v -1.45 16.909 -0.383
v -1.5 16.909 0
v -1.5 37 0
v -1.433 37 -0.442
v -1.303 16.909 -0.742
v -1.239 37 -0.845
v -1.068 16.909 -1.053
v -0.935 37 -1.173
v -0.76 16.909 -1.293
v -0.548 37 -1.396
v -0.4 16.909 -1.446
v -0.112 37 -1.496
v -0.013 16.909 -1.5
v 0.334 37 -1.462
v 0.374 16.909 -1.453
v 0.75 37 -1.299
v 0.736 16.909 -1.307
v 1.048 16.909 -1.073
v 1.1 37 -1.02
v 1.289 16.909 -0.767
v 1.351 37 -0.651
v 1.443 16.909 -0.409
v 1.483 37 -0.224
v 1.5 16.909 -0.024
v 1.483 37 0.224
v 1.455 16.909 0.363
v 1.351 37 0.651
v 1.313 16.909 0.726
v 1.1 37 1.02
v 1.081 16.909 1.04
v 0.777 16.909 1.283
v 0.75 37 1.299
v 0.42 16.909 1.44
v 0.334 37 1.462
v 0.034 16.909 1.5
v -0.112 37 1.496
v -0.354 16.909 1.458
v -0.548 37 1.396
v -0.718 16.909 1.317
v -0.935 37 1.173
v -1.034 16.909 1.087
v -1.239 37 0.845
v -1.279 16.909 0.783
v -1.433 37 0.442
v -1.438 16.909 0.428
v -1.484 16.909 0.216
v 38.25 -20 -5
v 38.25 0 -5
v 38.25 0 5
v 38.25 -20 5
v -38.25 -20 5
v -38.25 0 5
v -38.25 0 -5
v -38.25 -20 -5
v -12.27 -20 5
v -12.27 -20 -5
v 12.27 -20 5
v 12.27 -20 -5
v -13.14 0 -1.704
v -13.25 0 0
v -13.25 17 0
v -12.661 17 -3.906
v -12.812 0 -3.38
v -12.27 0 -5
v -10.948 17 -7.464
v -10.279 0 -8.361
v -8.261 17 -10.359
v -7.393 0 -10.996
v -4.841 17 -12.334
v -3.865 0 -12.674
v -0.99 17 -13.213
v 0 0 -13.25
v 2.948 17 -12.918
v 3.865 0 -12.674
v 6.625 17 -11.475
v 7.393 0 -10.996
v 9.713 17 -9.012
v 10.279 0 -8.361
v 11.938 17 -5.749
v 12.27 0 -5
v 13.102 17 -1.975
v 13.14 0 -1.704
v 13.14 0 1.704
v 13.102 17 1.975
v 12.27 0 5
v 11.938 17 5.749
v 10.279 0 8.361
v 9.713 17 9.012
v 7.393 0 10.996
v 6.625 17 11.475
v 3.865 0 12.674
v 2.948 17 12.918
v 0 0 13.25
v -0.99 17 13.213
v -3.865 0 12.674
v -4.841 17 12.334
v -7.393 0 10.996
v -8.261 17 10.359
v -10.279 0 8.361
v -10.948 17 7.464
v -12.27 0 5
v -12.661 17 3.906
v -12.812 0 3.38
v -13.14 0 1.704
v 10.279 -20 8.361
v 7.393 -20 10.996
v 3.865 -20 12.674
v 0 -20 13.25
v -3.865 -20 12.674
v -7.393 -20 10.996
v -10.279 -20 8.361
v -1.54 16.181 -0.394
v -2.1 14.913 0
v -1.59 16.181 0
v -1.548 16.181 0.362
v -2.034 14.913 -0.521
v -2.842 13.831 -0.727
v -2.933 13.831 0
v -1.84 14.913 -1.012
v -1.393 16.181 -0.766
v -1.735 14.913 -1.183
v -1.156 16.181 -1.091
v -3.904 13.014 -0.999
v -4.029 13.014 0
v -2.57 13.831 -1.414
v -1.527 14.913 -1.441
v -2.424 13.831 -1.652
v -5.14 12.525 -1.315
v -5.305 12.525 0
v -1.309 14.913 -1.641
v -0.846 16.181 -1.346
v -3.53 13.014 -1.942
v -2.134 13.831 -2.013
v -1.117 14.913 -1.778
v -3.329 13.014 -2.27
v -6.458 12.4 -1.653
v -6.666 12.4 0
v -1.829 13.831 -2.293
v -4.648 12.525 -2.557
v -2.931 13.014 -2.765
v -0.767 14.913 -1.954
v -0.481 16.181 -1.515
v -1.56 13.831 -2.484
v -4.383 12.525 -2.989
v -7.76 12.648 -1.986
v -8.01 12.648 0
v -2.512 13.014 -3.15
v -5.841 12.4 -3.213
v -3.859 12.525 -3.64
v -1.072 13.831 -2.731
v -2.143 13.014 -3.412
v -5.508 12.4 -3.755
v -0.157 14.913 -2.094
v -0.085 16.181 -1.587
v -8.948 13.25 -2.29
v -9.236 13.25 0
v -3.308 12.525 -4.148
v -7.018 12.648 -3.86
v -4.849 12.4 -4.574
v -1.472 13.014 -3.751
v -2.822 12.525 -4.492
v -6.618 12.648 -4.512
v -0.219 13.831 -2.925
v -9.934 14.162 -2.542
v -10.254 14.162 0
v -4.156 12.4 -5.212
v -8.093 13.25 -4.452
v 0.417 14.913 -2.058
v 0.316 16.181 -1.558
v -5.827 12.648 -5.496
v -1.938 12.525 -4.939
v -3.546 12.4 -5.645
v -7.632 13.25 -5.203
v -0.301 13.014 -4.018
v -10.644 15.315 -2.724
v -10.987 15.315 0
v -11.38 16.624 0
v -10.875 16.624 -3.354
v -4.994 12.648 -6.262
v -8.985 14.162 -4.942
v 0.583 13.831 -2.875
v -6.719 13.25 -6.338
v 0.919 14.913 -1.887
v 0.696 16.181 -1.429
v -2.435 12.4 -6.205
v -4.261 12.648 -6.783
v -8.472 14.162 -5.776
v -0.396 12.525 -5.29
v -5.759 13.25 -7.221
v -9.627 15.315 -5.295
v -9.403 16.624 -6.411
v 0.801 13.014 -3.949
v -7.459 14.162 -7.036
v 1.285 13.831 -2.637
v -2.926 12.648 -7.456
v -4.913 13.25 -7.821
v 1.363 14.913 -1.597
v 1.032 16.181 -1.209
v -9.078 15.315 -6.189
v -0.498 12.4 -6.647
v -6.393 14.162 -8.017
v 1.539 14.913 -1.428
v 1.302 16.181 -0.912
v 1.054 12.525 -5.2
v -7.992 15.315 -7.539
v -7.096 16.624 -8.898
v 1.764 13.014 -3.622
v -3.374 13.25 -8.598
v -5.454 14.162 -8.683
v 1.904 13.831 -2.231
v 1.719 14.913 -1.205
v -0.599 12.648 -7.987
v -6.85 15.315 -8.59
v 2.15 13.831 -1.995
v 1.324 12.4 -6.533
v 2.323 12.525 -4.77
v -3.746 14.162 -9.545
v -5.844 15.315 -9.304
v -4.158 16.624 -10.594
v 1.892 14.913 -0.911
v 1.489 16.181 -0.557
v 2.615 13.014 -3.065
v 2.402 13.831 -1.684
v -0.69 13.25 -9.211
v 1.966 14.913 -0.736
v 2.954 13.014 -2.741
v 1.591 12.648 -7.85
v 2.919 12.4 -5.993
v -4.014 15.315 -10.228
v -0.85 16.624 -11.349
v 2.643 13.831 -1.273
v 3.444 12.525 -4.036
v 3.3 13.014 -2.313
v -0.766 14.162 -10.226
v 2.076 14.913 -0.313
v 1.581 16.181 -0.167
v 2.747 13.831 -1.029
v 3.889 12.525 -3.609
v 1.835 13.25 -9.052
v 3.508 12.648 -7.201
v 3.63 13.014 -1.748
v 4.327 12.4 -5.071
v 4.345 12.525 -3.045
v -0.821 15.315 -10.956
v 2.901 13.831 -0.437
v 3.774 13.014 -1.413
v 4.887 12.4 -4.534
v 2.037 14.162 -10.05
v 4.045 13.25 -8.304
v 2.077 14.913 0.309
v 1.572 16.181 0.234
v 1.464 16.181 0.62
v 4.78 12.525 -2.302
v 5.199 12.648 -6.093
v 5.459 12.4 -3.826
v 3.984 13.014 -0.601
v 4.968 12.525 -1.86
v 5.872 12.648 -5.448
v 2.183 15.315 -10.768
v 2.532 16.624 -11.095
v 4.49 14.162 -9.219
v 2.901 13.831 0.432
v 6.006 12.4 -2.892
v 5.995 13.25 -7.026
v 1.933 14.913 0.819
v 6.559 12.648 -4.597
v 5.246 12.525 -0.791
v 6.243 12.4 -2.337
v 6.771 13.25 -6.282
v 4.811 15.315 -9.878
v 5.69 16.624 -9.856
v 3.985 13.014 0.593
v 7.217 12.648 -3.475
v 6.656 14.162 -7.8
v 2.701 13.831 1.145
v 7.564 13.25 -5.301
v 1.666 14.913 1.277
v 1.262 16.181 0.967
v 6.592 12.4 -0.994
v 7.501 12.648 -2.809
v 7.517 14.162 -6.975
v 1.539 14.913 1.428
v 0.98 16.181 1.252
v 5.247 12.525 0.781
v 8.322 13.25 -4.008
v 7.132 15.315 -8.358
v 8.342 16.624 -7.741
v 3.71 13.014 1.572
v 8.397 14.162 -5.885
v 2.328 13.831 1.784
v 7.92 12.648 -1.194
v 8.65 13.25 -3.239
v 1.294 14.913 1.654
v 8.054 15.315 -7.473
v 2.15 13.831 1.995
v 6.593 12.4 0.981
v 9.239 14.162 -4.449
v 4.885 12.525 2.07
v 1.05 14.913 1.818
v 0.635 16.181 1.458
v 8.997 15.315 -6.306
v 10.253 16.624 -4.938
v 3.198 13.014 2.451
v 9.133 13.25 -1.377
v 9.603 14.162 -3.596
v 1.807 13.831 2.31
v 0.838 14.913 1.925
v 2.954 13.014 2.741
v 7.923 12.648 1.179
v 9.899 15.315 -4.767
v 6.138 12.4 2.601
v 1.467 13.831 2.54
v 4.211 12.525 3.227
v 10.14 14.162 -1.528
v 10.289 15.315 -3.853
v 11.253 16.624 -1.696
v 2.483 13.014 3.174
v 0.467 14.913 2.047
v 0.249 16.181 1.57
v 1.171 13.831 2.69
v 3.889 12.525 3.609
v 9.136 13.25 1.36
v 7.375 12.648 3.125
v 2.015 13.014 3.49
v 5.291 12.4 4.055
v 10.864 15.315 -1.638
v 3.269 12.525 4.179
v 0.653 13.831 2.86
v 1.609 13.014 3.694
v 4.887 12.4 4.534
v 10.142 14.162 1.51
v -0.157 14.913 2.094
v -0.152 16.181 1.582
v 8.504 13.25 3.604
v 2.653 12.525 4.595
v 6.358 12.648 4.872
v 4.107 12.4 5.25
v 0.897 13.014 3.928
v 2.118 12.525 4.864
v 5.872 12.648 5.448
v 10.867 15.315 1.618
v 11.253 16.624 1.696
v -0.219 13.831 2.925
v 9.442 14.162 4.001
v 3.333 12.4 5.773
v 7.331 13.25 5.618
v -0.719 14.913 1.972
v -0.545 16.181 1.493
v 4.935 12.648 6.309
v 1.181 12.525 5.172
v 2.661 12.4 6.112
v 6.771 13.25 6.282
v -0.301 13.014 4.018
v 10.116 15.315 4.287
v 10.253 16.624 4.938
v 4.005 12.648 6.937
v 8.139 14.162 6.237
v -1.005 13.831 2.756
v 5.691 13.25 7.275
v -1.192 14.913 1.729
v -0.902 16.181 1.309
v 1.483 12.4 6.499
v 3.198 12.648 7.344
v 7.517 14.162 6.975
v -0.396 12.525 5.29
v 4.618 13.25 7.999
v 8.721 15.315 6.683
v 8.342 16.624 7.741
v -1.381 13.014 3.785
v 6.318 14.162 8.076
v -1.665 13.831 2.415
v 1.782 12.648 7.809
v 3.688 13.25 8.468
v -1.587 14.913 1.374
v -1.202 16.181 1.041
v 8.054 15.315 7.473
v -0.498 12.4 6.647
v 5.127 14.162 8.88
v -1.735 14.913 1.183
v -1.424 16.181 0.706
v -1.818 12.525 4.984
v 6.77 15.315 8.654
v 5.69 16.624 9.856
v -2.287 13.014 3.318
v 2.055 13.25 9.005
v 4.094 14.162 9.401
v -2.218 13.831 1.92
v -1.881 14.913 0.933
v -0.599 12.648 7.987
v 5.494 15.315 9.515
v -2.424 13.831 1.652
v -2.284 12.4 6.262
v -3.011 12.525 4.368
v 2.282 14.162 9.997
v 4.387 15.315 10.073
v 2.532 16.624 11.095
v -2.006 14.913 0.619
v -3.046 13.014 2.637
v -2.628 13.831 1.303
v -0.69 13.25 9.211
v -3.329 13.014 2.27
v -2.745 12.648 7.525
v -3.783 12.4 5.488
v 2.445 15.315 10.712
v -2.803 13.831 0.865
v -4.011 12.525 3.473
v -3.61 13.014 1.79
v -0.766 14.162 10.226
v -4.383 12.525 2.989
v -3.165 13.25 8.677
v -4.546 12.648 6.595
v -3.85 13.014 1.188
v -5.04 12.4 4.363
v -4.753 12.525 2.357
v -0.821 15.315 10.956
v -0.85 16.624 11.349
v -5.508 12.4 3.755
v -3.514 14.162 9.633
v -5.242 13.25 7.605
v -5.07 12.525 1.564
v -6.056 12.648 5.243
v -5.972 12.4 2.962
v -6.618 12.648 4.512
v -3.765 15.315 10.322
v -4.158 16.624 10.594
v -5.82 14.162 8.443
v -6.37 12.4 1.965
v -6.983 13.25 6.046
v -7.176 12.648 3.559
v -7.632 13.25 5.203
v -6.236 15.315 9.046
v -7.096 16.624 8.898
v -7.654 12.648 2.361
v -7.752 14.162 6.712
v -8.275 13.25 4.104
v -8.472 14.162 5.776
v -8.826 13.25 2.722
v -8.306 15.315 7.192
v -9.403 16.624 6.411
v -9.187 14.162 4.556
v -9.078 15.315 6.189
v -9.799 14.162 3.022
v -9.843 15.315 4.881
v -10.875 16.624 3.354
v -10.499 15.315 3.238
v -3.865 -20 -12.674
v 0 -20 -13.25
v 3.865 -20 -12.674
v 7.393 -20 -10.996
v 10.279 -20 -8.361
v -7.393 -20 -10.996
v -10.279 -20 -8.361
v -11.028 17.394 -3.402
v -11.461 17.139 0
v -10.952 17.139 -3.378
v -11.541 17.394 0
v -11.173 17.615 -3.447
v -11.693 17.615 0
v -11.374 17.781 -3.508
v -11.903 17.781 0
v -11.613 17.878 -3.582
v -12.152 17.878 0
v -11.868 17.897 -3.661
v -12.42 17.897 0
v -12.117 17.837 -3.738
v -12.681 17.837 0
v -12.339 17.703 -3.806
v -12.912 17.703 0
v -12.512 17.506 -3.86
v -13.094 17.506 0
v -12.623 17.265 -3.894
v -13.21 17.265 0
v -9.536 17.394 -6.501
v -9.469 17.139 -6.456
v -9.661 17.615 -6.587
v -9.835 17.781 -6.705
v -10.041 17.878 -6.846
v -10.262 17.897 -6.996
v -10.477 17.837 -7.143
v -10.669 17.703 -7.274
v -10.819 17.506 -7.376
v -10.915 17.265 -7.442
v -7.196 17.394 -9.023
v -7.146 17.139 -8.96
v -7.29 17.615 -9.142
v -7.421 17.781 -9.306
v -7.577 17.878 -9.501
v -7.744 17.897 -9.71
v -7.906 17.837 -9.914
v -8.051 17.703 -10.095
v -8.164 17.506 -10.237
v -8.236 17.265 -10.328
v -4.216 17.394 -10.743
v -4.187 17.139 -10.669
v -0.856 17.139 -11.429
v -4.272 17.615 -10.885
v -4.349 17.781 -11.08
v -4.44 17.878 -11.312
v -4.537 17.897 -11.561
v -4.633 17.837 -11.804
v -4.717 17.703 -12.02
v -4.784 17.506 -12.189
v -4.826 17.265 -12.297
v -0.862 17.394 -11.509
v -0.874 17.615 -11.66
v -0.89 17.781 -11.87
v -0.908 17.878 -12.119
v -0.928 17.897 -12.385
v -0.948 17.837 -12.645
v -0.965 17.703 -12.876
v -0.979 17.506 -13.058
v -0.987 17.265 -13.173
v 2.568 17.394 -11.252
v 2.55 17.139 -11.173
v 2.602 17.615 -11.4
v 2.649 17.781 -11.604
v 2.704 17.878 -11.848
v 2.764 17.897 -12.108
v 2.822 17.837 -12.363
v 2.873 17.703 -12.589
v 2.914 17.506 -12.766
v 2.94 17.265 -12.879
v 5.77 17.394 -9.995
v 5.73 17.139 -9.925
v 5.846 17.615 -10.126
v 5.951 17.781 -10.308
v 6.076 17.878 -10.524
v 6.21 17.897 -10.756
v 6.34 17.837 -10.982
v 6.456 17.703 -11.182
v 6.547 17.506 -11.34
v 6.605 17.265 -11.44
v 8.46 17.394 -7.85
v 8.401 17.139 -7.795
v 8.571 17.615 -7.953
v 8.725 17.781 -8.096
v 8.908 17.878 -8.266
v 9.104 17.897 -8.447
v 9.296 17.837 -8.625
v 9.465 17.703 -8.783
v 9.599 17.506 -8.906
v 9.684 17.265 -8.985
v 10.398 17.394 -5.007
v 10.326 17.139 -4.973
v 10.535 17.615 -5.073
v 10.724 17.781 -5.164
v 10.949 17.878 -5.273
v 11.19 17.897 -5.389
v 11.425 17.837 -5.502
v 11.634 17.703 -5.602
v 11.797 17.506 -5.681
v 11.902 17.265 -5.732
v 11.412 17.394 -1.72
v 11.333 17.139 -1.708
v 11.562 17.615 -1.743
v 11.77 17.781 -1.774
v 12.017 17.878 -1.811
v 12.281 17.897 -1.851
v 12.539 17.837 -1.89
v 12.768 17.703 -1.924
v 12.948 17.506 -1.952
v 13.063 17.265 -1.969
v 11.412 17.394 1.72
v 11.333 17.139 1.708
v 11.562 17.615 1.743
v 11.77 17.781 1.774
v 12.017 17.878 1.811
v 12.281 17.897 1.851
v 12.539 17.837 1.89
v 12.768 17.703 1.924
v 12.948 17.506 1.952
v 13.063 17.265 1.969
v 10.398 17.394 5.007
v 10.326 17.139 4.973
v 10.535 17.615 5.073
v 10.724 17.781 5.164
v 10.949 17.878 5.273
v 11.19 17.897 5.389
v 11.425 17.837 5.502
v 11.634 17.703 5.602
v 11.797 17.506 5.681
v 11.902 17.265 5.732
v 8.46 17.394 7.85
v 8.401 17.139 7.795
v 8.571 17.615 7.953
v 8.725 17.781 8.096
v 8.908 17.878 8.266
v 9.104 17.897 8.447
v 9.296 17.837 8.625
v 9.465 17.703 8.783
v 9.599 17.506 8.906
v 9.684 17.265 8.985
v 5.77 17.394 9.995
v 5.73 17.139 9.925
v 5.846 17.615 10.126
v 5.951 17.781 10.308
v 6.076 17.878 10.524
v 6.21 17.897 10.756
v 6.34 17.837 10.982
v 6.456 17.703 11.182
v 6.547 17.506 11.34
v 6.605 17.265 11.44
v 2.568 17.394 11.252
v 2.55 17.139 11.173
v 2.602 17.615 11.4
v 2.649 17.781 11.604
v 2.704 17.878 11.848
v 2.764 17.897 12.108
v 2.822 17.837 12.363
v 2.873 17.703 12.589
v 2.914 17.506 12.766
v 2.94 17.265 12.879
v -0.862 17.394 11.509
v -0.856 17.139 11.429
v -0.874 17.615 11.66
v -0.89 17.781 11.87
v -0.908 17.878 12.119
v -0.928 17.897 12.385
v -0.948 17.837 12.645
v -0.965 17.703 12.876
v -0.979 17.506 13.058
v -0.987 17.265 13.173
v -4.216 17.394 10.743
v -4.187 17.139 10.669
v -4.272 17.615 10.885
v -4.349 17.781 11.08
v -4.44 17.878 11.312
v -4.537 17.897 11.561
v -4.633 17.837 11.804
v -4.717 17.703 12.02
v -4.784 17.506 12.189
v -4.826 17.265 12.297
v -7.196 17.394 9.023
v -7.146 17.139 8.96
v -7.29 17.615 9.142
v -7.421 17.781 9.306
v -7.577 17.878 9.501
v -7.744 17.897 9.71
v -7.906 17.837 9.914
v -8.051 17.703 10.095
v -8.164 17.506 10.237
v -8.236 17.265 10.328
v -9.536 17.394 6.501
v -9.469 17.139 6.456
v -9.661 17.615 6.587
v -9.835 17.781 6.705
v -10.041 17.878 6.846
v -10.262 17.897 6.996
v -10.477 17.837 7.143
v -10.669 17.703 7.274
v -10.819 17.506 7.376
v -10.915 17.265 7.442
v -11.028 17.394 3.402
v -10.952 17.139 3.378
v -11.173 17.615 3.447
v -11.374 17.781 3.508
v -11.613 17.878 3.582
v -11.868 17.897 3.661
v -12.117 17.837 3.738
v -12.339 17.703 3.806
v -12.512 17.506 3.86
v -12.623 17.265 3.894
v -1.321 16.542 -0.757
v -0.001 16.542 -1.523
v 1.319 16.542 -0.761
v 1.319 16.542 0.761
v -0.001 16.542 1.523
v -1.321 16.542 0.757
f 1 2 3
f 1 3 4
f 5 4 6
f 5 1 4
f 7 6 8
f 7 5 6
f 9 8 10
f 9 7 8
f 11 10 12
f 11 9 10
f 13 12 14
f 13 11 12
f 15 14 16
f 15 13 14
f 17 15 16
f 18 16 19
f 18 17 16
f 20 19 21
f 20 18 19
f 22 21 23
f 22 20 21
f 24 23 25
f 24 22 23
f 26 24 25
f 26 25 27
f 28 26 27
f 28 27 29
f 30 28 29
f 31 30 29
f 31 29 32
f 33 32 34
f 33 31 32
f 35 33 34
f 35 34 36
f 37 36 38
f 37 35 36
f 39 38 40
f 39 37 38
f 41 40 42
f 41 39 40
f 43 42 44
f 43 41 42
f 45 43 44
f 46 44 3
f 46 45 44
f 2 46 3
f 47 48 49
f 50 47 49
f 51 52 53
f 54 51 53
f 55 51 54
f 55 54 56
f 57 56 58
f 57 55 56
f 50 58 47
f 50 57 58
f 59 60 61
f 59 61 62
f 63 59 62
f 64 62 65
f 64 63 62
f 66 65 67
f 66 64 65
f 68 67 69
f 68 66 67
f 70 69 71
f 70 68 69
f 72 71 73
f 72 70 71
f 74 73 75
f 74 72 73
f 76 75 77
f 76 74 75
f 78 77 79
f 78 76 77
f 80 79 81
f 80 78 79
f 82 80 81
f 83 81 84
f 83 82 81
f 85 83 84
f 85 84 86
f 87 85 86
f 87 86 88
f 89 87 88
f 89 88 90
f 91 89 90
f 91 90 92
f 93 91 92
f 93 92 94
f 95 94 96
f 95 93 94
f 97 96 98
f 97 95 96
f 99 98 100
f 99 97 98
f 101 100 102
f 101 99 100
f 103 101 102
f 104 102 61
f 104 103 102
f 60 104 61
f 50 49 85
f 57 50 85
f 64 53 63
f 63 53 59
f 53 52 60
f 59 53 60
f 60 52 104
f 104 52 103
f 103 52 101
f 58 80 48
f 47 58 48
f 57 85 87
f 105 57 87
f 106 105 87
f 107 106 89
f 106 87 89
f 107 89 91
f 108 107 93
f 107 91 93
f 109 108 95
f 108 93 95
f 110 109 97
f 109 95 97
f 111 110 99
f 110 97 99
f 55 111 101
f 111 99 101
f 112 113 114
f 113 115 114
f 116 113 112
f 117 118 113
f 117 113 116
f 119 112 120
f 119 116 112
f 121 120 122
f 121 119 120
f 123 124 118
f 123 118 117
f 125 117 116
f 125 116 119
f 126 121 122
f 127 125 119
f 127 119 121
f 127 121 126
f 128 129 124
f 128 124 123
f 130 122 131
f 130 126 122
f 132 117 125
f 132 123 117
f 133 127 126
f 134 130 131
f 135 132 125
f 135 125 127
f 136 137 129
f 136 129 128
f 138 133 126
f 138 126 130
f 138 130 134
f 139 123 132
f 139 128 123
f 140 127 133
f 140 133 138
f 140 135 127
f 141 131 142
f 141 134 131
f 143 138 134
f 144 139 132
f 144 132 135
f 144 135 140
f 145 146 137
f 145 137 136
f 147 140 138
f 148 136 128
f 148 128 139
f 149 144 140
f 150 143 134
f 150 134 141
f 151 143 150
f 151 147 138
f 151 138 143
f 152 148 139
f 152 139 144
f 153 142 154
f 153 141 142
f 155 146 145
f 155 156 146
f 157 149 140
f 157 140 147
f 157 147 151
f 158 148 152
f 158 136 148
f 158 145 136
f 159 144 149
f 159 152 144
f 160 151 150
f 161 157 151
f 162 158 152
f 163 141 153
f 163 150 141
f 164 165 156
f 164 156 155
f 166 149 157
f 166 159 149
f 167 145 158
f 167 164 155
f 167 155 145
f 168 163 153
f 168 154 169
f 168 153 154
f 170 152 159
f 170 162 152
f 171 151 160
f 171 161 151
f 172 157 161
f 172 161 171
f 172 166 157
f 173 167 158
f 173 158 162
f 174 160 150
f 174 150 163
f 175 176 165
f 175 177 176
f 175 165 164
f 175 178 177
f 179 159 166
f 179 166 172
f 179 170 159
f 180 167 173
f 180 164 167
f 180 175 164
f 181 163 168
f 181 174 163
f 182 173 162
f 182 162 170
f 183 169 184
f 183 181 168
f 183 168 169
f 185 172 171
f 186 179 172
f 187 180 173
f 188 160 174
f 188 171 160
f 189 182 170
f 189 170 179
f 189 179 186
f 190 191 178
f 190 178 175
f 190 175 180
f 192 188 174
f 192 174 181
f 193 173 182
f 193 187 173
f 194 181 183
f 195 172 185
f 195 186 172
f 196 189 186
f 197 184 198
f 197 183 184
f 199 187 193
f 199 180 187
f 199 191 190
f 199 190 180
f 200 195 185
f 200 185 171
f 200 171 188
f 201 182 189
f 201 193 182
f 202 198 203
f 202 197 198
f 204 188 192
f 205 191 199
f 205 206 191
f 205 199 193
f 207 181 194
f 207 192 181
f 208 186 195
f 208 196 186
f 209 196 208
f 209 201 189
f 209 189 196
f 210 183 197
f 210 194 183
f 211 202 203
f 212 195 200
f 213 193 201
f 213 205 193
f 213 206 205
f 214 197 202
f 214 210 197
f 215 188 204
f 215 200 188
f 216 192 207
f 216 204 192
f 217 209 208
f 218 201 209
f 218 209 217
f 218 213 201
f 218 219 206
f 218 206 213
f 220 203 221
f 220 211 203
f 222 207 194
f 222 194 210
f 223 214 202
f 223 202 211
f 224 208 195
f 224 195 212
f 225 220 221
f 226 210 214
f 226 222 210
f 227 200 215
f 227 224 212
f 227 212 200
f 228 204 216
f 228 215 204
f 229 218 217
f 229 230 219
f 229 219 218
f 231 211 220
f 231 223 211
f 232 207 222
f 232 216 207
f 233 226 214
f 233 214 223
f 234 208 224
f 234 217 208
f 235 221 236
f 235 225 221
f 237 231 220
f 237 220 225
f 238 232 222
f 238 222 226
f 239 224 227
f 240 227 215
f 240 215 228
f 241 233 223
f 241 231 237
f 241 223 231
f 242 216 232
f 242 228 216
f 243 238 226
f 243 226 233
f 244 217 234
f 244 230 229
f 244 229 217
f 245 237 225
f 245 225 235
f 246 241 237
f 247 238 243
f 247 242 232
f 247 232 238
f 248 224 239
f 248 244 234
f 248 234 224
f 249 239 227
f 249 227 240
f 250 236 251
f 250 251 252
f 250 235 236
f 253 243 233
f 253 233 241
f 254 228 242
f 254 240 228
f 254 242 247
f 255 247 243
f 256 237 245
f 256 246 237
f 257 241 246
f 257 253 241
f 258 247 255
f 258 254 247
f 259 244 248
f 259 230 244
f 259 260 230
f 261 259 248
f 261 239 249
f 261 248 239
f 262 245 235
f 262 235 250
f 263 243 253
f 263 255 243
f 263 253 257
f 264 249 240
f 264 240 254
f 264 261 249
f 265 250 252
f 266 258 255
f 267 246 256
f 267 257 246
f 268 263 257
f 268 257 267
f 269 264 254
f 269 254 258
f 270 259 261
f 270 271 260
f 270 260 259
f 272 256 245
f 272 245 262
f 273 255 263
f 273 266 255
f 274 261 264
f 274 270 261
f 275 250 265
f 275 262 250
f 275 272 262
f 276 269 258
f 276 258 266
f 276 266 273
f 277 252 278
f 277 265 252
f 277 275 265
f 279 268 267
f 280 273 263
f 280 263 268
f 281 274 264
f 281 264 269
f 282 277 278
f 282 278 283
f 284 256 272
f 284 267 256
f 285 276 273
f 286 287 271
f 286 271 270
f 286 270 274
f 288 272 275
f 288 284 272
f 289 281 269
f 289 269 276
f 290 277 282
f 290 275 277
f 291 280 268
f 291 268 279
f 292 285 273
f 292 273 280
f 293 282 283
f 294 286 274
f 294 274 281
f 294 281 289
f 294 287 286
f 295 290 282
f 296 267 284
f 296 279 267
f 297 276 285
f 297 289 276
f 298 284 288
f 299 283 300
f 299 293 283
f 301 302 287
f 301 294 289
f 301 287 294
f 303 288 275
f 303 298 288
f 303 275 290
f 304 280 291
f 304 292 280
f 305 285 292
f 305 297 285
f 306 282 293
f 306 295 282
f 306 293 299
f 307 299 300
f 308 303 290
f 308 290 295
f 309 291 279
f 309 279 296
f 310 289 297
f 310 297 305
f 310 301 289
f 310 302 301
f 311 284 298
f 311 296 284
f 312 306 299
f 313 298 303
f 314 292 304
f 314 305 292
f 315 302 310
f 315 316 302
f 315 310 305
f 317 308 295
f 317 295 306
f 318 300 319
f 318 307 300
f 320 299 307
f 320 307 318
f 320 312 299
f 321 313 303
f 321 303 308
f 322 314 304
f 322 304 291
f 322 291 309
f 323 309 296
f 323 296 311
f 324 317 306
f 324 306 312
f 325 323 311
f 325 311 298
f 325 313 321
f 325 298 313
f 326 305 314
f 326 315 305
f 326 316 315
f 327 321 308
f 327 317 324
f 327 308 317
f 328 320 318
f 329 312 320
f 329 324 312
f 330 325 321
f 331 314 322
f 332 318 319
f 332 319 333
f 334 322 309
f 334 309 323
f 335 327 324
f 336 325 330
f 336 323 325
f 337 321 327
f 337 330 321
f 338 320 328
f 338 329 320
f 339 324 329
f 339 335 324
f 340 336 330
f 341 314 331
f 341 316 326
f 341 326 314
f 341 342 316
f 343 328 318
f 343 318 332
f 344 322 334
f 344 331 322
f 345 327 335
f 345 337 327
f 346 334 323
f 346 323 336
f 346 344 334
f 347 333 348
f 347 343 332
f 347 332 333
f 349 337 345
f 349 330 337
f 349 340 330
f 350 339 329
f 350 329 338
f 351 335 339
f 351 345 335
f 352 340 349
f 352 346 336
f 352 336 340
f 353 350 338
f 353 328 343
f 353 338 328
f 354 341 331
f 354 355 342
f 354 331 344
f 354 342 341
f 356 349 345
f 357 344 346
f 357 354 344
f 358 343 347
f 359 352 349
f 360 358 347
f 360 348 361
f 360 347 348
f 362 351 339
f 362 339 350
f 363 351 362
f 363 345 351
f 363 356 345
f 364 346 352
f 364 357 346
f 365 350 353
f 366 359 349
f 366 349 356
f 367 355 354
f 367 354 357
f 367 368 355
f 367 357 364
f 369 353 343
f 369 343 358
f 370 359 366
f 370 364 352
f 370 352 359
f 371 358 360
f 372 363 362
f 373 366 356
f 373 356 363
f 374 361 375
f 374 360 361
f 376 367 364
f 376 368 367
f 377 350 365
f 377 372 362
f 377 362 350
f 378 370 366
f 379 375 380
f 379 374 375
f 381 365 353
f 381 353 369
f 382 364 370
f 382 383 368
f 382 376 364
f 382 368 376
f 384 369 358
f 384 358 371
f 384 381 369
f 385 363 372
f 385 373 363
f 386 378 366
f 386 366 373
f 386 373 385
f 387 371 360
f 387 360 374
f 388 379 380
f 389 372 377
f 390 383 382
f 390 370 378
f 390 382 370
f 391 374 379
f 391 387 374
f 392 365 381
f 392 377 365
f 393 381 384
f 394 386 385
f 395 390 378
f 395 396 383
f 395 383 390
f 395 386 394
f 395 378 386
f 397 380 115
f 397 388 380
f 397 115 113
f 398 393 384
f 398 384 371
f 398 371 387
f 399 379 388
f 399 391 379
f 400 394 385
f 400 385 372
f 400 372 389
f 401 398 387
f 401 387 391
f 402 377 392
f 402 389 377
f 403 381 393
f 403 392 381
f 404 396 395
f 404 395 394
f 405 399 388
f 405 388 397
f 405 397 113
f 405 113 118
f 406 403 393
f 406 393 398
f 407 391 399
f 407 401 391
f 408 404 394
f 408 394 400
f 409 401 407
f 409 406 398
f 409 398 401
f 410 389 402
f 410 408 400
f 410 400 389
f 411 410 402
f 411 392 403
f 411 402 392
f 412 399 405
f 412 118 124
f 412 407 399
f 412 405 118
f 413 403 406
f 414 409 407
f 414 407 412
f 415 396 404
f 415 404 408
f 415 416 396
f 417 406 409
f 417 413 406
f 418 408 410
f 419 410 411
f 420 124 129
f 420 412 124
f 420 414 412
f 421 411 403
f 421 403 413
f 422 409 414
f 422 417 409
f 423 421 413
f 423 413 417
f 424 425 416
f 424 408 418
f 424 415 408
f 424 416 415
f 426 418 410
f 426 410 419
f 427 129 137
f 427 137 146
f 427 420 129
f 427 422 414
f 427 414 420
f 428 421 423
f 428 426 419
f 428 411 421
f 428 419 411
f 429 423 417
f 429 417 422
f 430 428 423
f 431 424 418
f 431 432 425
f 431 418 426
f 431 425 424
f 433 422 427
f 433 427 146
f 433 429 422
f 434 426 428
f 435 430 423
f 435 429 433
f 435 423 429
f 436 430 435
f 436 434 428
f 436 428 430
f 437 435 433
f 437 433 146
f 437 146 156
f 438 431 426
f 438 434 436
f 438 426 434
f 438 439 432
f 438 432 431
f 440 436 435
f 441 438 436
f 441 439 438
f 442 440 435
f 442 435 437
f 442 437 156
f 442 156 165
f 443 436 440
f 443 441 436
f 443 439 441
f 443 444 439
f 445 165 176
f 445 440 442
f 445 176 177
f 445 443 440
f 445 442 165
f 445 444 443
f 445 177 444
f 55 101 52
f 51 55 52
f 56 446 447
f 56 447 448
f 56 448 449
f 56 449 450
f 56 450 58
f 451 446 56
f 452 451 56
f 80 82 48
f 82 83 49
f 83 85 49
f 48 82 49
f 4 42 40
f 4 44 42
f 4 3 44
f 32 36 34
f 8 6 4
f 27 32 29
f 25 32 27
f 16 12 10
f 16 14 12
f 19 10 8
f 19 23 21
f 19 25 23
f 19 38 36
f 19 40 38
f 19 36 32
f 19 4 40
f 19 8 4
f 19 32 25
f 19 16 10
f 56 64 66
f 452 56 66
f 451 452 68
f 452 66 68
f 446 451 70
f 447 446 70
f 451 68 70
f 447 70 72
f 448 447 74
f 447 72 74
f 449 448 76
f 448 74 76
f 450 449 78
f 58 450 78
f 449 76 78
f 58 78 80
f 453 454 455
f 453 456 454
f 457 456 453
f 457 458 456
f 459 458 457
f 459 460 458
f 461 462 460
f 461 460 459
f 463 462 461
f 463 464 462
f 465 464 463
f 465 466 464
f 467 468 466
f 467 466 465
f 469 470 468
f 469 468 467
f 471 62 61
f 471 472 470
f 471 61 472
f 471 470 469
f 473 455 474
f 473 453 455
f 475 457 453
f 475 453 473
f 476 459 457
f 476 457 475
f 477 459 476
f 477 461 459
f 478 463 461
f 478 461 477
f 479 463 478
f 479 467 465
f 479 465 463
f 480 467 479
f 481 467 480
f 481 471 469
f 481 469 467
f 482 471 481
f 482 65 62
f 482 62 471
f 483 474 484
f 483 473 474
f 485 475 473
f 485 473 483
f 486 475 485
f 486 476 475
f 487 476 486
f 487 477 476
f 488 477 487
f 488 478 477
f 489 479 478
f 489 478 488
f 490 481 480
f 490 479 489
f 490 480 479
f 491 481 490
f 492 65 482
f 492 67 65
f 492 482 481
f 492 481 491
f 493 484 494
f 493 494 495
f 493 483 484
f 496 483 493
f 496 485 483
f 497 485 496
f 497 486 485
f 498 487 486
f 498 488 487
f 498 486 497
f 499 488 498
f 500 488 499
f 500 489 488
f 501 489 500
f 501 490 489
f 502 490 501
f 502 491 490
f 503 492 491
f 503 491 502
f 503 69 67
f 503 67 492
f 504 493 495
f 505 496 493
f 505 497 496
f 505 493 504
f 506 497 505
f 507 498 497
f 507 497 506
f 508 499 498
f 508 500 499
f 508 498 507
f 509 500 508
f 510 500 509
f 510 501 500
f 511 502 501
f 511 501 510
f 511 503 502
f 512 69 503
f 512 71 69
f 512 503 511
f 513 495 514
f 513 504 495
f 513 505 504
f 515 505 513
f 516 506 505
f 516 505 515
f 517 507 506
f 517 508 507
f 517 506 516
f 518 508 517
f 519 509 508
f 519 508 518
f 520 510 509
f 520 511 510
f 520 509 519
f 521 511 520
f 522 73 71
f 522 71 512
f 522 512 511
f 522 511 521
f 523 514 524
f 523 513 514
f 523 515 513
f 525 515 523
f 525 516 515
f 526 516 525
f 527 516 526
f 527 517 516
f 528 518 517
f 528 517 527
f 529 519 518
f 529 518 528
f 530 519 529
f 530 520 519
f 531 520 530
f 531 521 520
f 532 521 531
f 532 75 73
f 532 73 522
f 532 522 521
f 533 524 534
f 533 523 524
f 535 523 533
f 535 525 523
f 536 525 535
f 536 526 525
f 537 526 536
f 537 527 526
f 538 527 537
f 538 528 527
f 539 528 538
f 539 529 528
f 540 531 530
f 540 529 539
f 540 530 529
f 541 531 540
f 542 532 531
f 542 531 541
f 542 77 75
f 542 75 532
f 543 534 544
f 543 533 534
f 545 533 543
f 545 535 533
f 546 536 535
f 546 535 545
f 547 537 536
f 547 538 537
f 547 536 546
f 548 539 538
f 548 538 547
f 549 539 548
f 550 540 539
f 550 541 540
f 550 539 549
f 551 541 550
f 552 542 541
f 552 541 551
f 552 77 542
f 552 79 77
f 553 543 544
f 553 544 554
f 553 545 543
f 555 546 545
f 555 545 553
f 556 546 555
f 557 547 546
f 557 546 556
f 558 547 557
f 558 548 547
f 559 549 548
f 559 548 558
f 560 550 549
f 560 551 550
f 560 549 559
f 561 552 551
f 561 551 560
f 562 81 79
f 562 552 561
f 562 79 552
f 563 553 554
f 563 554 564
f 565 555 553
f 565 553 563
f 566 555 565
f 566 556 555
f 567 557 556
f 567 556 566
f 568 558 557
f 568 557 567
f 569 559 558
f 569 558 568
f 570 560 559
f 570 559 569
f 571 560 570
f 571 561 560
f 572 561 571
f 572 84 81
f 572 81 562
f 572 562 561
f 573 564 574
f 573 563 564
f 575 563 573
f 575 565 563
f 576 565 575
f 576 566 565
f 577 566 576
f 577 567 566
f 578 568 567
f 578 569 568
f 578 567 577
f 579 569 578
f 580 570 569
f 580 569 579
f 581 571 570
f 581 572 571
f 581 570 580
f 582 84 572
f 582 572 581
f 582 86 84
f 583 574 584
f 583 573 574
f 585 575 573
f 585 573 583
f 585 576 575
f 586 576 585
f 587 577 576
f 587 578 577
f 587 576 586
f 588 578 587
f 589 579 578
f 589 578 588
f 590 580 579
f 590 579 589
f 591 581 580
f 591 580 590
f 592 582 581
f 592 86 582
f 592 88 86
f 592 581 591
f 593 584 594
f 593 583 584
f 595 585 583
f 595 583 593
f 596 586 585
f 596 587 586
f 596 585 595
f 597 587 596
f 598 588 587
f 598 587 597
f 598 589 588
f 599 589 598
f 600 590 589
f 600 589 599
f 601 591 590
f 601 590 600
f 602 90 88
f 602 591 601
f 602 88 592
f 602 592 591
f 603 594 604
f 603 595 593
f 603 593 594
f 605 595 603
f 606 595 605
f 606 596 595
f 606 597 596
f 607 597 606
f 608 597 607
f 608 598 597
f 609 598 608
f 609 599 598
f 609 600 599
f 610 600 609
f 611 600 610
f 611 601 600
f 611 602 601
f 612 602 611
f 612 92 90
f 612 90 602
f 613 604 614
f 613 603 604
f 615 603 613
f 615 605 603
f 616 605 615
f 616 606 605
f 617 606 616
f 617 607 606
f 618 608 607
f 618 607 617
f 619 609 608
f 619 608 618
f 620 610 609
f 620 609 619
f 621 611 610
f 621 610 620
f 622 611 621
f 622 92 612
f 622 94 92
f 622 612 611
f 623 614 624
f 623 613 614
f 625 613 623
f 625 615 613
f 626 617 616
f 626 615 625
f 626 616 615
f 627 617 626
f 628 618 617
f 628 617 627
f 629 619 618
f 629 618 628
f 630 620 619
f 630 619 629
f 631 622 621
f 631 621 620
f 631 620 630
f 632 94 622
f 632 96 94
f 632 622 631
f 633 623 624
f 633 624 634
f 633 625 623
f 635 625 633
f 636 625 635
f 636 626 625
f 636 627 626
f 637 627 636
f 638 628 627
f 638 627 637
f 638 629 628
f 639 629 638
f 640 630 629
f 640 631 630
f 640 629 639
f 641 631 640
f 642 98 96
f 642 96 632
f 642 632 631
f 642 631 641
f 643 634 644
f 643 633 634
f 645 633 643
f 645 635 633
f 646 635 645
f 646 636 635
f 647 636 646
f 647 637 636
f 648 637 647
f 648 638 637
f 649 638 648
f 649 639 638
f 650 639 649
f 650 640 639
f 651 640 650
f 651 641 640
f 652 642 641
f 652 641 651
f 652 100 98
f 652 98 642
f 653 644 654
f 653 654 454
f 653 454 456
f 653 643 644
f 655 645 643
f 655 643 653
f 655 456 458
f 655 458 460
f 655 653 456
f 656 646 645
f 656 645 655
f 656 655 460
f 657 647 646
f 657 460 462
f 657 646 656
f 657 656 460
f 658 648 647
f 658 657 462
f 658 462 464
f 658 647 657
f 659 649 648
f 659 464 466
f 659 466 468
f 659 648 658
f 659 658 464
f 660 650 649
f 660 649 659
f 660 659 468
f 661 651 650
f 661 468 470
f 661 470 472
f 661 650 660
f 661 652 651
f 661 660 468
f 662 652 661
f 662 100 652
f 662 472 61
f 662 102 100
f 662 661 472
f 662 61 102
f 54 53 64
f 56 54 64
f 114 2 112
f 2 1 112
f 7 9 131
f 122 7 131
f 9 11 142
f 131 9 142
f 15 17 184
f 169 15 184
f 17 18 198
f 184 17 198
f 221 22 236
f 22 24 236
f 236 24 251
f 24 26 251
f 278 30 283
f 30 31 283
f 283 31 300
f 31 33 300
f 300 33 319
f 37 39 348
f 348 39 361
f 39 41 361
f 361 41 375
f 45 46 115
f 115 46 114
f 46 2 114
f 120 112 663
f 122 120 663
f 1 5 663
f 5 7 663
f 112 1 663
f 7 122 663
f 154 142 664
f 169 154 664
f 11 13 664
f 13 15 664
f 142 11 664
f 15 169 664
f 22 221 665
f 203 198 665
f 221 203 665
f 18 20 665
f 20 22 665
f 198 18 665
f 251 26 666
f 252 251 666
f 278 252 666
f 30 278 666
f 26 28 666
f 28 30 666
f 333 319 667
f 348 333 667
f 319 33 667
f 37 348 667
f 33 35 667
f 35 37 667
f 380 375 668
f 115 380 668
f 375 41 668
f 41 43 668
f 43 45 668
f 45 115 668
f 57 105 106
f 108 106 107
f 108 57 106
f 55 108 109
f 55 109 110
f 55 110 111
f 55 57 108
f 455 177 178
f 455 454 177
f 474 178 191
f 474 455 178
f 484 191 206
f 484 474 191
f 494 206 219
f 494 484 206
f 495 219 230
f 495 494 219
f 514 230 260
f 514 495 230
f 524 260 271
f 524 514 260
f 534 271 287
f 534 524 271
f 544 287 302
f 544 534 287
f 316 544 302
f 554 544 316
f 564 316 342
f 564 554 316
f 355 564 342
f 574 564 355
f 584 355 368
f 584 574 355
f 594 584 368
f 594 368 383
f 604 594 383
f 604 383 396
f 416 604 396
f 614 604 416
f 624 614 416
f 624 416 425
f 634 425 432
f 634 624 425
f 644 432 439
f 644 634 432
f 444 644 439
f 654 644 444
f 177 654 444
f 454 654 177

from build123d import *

# Parameters (mm, degrees)
F2_R     = 3
F4_DEPTH = 20
F5_DEPTH = 20


with BuildPart() as f1:
    # F0 (on Top) → F1 (revolve)
    with BuildSketch(Plane.XY):
        with BuildLine():
            Line((-13.25, 0), (0, 0))
            Line((0, 0), (0, 37))
            Line((0, 37), (-1.5, 37))
            Line((-1.5, 37), (-1.5, 16.6235913226))
            ThreePointArc((-1.5, 16.6235913226), (-6.4401709177, 12.3947665973), (-11.3803418353, 16.6235913226))
            Line((-11.3803418353, 16.6235913226), (-11.4607692348, 17.1388115494))
            ThreePointArc((-11.4607692348, 17.1388115494), (-12.4196143352, 17.8973036522), (-13.25, 17))
            Line((-13.25, 17), (-13.25, 0))
        make_face()
    revolve(axis=Axis((0, 18.5, 0), (0, -1, 0)))

    # F2
    f2_edges = [f1.edges().sort_by_distance(p)[0] for p in [
        (1.5, 16.623591, 0),
    ]]
    fillet(f2_edges, radius=F2_R)

    # F3 (on face) → F4 (join)
    with BuildSketch(Plane.XZ):
        with BuildLine():
            Line((-12.2703911918, 5), (-38.25, 5))
            Line((-38.25, 5), (-38.25, -5))
            Line((-38.25, -5), (-12.2703911918, -5))
            ThreePointArc((-12.2703911918, -5), (-13.25, 0), (-12.2703911918, 5))
        make_face()
        with BuildLine():
            Line((12.2703911918, 5), (-12.2703911918, 5))
            ThreePointArc((-12.2703911918, 5), (-13.25, 0), (-12.2703911918, -5))
            Line((-12.2703911918, -5), (12.2703911918, -5))
            ThreePointArc((12.2703911918, -5), (13.0027916866, -2.5475298535), (13.25, 0))
            ThreePointArc((13.25, 0), (13.0027916866, 2.5475298535), (12.2703911918, 5))
        make_face()
        with BuildLine():
            Line((38.25, 5), (12.2703911918, 5))
            ThreePointArc((12.2703911918, 5), (13.0027916866, 2.5475298535), (13.25, 0))
            ThreePointArc((13.25, 0), (13.0027916866, -2.5475298535), (12.2703911918, -5))
            Line((12.2703911918, -5), (38.25, -5))
            Line((38.25, -5), (38.25, 5))
        make_face()
    extrude(amount=F4_DEPTH)

    # F5 (add): faces of the model
    f5_faces = [f1.faces().sort_by_distance(p)[0] for p in [
        (0, 0, 8.4077666552),
        (0, 0, -8.4077666552),
    ]]
    extrude(f5_faces, amount=F5_DEPTH)


solid = f1.part
